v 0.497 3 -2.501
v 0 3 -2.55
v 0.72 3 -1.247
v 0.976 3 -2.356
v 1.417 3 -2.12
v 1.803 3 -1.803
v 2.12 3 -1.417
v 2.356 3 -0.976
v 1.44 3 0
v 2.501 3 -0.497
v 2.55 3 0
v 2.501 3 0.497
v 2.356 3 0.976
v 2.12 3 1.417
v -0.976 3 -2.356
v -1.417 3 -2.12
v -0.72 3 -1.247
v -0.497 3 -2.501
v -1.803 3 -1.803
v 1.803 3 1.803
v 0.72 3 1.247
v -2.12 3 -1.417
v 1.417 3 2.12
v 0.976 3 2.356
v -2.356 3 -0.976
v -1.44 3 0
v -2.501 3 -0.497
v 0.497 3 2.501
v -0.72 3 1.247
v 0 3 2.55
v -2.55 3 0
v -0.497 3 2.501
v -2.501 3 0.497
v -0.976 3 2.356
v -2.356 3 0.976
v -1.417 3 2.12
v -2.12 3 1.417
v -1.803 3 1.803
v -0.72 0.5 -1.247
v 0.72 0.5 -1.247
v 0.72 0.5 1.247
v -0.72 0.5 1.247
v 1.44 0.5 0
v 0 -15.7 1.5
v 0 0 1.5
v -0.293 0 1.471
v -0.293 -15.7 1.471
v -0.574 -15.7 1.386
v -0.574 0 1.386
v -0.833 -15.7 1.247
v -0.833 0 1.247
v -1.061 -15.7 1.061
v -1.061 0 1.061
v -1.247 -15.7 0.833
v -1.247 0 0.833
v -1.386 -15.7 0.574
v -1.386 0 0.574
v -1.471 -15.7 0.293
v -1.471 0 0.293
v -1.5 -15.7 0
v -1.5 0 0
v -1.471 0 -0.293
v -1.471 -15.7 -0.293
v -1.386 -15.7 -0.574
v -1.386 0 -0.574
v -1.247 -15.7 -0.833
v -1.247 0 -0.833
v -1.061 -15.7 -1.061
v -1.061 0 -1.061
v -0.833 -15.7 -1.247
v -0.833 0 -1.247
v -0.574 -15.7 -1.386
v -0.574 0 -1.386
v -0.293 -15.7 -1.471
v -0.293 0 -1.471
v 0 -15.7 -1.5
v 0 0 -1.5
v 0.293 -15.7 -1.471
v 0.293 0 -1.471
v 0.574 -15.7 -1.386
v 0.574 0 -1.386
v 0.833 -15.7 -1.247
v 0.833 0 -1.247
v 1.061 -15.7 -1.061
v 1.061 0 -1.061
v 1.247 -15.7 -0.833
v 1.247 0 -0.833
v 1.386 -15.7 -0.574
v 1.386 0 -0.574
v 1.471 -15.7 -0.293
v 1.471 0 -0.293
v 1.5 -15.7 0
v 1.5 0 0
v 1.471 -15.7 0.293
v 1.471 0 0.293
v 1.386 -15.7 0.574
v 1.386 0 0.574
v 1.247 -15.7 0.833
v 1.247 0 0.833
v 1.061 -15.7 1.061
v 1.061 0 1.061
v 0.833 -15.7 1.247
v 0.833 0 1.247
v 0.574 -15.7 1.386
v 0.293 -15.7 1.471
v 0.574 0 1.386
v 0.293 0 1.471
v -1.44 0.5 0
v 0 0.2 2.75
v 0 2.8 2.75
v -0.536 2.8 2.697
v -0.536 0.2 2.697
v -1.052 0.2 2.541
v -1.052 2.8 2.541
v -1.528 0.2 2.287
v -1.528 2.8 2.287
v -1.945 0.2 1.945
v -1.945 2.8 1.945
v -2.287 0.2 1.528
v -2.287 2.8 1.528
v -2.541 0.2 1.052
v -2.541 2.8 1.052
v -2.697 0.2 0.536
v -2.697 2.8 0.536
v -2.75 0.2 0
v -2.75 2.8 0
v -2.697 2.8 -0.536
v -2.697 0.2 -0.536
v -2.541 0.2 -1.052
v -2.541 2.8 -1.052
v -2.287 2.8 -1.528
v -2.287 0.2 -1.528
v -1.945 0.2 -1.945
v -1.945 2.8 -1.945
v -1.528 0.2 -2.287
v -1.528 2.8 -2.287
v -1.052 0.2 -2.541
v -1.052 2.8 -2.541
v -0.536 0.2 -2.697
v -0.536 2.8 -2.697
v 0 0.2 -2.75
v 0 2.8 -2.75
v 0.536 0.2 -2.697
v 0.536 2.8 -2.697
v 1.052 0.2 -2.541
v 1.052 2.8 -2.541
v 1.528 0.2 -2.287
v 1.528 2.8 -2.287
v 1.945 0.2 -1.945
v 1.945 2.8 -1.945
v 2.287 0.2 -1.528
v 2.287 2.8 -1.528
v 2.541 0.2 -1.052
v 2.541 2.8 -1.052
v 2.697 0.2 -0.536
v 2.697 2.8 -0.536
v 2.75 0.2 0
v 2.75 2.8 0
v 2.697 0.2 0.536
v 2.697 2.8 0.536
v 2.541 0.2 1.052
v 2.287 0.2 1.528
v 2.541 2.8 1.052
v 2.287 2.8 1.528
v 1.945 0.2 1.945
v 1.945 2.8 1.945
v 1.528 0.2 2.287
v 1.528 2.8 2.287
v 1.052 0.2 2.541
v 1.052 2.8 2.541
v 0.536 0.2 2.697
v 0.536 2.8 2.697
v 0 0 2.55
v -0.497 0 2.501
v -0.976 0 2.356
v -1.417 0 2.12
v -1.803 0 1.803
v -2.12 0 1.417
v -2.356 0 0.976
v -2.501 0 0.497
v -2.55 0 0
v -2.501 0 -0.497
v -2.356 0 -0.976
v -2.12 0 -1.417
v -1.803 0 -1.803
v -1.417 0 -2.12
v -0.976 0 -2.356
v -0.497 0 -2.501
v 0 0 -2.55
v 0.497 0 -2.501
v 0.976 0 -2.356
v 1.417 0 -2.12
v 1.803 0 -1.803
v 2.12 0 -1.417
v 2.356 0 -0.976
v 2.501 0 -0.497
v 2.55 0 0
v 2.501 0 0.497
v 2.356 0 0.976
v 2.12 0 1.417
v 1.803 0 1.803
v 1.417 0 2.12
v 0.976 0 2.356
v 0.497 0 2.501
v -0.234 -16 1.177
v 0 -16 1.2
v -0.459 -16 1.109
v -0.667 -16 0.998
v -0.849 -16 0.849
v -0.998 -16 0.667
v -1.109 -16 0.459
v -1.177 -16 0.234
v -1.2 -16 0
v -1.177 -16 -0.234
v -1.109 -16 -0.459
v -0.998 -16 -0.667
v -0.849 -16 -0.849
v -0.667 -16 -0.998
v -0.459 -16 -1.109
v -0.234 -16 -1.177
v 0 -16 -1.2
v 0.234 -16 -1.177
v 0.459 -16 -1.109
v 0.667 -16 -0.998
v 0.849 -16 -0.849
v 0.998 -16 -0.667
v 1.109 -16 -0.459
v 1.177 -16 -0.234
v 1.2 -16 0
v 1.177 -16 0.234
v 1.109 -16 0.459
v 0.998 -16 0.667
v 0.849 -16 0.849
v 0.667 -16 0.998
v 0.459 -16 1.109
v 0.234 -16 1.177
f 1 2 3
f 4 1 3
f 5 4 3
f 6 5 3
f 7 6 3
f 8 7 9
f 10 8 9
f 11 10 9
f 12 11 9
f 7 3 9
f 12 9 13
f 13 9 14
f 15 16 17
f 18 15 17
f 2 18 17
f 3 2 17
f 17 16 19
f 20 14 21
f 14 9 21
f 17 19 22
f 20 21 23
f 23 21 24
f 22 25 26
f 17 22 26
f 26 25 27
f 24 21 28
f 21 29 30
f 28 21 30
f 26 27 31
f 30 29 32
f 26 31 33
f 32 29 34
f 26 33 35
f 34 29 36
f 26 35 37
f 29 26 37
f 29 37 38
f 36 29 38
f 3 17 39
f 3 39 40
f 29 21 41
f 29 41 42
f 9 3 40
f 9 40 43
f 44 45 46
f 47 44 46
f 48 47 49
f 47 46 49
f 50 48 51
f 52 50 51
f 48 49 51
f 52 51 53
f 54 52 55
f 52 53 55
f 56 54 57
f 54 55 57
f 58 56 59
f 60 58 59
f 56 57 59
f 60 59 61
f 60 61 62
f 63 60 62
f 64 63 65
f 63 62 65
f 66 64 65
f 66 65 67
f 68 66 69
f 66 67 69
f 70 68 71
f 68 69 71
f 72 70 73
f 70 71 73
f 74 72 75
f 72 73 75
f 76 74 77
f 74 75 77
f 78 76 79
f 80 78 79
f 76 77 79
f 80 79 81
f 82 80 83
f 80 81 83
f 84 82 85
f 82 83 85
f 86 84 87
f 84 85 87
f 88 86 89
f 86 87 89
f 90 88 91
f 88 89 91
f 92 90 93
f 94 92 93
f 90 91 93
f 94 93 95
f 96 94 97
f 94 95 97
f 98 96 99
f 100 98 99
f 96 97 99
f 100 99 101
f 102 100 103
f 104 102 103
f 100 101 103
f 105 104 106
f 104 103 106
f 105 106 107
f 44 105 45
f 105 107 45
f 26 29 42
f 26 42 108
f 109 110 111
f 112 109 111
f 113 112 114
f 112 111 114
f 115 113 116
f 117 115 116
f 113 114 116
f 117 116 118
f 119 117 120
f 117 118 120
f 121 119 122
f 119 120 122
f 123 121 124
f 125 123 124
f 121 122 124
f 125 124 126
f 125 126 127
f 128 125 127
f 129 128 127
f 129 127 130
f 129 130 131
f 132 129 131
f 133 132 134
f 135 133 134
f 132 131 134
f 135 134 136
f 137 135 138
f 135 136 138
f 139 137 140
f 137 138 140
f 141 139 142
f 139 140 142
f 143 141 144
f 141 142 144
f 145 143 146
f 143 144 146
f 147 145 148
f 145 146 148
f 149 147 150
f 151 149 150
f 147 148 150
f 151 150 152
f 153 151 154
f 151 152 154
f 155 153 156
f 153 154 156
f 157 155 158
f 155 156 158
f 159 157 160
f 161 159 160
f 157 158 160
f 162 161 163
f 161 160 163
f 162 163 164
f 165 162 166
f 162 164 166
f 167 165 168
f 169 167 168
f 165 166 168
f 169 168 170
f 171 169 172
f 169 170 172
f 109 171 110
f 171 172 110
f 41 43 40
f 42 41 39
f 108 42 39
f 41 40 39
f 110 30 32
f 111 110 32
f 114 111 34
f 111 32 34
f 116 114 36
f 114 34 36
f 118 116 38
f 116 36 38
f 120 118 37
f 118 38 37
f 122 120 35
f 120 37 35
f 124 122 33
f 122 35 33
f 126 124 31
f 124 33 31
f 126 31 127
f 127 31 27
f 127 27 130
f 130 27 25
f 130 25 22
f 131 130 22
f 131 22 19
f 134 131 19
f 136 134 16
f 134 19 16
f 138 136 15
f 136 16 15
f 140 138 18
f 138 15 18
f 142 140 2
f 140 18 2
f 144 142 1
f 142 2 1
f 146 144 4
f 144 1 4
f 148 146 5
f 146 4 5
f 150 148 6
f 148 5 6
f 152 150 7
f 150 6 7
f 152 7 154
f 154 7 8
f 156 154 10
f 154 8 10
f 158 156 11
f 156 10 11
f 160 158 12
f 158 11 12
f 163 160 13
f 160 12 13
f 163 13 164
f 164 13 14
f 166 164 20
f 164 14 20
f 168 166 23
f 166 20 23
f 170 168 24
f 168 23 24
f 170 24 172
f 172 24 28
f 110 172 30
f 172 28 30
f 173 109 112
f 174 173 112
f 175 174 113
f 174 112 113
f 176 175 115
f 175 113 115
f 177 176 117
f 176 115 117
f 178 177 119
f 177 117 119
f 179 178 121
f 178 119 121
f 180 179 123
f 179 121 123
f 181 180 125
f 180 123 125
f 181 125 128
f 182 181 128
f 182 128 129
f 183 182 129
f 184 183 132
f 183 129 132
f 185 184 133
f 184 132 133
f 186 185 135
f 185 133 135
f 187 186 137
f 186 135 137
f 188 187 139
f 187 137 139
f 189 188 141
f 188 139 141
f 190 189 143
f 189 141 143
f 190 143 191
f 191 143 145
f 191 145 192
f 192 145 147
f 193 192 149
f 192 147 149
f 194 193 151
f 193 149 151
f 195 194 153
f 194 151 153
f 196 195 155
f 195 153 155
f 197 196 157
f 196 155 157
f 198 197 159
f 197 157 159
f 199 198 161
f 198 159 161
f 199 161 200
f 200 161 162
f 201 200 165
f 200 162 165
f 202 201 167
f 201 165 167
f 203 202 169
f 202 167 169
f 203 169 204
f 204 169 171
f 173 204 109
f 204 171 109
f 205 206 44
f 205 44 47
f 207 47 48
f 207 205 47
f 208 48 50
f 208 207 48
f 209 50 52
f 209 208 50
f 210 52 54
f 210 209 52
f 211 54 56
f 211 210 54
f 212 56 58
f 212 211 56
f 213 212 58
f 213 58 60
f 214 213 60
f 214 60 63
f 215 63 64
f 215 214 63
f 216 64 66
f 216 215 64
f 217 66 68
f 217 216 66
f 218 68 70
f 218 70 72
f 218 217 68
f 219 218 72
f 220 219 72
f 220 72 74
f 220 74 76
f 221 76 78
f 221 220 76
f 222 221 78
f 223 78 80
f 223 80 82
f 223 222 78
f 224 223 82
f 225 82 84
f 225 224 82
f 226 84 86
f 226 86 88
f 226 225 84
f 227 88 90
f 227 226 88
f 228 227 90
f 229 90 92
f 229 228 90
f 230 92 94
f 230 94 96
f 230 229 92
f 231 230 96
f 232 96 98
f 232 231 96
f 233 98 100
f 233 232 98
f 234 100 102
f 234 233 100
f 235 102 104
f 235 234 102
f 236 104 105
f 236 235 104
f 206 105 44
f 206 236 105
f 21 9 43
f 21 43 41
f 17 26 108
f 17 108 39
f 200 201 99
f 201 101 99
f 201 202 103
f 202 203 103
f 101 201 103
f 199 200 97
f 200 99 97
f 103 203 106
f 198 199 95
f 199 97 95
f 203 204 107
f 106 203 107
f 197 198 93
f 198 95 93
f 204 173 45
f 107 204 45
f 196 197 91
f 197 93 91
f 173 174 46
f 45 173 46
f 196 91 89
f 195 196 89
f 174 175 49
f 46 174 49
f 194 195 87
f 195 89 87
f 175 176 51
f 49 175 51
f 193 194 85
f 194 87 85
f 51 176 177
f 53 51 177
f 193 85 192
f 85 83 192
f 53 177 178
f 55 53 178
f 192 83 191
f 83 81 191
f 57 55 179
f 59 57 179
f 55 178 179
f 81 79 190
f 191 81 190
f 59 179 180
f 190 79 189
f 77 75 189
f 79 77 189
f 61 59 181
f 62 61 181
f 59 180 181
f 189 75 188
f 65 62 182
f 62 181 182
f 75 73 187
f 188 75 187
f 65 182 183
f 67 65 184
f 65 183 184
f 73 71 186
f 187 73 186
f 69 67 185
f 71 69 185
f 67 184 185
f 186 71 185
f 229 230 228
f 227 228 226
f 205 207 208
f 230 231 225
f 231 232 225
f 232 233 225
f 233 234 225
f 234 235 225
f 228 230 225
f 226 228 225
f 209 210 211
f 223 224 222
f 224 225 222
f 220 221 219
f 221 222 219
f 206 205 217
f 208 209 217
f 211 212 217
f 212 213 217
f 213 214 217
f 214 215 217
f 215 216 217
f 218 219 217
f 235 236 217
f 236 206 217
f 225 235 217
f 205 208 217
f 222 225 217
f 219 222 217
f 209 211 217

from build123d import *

# Parameters (mm, degrees)
CHAMFER_1_SIZE      = 0.2
CHAMFER_2_SIZE      = 0.3
CUT_EXTRUDE_1_DEPTH = 2.5


with BuildPart() as part:
    # 草图1 → 旋转1 (revolve)
    with BuildSketch(Plane.XY, mode=Mode.PRIVATE) as revolve_1_sk:
        Polygon((1.5, 0), (2.75, 0), (2.75, 3), (0, 3), (0, 0), (0, -16), (1.5, -16), align=None)
    revolve(revolve_1_sk.sketch.rotate(Axis((0, 3, 0), (0, -1, 0)), 90), axis=Axis((0, 3, 0), (0, -1, 0)))

    # 倒角1
    chamfer_1_edges = [part.edges().sort_by_distance(p)[0] for p in [
        (0, 3, -2.75),
        (0, 0, -2.75),
    ]]
    chamfer(chamfer_1_edges, length=CHAMFER_1_SIZE)

    # 倒角2
    chamfer_2_edges = [part.edges().sort_by_distance(p)[0] for p in [
        (0, -16, -1.5),
    ]]
    chamfer(chamfer_2_edges, length=CHAMFER_2_SIZE)

    # 草图2 → 切除-拉伸1 (cut)
    with BuildSketch(Plane(origin=(0, 3, 0), x_dir=(1, 0, 0), z_dir=(0, 1, 0))):
        Polygon((-0.72, 1.247076581), (0.72, 1.247076581), (1.44, 0), (0.72, -1.247076581), (-0.72, -1.247076581), (-1.44, 0), align=None)
    extrude(amount=-CUT_EXTRUDE_1_DEPTH, mode=Mode.SUBTRACT)


solid = part.part
